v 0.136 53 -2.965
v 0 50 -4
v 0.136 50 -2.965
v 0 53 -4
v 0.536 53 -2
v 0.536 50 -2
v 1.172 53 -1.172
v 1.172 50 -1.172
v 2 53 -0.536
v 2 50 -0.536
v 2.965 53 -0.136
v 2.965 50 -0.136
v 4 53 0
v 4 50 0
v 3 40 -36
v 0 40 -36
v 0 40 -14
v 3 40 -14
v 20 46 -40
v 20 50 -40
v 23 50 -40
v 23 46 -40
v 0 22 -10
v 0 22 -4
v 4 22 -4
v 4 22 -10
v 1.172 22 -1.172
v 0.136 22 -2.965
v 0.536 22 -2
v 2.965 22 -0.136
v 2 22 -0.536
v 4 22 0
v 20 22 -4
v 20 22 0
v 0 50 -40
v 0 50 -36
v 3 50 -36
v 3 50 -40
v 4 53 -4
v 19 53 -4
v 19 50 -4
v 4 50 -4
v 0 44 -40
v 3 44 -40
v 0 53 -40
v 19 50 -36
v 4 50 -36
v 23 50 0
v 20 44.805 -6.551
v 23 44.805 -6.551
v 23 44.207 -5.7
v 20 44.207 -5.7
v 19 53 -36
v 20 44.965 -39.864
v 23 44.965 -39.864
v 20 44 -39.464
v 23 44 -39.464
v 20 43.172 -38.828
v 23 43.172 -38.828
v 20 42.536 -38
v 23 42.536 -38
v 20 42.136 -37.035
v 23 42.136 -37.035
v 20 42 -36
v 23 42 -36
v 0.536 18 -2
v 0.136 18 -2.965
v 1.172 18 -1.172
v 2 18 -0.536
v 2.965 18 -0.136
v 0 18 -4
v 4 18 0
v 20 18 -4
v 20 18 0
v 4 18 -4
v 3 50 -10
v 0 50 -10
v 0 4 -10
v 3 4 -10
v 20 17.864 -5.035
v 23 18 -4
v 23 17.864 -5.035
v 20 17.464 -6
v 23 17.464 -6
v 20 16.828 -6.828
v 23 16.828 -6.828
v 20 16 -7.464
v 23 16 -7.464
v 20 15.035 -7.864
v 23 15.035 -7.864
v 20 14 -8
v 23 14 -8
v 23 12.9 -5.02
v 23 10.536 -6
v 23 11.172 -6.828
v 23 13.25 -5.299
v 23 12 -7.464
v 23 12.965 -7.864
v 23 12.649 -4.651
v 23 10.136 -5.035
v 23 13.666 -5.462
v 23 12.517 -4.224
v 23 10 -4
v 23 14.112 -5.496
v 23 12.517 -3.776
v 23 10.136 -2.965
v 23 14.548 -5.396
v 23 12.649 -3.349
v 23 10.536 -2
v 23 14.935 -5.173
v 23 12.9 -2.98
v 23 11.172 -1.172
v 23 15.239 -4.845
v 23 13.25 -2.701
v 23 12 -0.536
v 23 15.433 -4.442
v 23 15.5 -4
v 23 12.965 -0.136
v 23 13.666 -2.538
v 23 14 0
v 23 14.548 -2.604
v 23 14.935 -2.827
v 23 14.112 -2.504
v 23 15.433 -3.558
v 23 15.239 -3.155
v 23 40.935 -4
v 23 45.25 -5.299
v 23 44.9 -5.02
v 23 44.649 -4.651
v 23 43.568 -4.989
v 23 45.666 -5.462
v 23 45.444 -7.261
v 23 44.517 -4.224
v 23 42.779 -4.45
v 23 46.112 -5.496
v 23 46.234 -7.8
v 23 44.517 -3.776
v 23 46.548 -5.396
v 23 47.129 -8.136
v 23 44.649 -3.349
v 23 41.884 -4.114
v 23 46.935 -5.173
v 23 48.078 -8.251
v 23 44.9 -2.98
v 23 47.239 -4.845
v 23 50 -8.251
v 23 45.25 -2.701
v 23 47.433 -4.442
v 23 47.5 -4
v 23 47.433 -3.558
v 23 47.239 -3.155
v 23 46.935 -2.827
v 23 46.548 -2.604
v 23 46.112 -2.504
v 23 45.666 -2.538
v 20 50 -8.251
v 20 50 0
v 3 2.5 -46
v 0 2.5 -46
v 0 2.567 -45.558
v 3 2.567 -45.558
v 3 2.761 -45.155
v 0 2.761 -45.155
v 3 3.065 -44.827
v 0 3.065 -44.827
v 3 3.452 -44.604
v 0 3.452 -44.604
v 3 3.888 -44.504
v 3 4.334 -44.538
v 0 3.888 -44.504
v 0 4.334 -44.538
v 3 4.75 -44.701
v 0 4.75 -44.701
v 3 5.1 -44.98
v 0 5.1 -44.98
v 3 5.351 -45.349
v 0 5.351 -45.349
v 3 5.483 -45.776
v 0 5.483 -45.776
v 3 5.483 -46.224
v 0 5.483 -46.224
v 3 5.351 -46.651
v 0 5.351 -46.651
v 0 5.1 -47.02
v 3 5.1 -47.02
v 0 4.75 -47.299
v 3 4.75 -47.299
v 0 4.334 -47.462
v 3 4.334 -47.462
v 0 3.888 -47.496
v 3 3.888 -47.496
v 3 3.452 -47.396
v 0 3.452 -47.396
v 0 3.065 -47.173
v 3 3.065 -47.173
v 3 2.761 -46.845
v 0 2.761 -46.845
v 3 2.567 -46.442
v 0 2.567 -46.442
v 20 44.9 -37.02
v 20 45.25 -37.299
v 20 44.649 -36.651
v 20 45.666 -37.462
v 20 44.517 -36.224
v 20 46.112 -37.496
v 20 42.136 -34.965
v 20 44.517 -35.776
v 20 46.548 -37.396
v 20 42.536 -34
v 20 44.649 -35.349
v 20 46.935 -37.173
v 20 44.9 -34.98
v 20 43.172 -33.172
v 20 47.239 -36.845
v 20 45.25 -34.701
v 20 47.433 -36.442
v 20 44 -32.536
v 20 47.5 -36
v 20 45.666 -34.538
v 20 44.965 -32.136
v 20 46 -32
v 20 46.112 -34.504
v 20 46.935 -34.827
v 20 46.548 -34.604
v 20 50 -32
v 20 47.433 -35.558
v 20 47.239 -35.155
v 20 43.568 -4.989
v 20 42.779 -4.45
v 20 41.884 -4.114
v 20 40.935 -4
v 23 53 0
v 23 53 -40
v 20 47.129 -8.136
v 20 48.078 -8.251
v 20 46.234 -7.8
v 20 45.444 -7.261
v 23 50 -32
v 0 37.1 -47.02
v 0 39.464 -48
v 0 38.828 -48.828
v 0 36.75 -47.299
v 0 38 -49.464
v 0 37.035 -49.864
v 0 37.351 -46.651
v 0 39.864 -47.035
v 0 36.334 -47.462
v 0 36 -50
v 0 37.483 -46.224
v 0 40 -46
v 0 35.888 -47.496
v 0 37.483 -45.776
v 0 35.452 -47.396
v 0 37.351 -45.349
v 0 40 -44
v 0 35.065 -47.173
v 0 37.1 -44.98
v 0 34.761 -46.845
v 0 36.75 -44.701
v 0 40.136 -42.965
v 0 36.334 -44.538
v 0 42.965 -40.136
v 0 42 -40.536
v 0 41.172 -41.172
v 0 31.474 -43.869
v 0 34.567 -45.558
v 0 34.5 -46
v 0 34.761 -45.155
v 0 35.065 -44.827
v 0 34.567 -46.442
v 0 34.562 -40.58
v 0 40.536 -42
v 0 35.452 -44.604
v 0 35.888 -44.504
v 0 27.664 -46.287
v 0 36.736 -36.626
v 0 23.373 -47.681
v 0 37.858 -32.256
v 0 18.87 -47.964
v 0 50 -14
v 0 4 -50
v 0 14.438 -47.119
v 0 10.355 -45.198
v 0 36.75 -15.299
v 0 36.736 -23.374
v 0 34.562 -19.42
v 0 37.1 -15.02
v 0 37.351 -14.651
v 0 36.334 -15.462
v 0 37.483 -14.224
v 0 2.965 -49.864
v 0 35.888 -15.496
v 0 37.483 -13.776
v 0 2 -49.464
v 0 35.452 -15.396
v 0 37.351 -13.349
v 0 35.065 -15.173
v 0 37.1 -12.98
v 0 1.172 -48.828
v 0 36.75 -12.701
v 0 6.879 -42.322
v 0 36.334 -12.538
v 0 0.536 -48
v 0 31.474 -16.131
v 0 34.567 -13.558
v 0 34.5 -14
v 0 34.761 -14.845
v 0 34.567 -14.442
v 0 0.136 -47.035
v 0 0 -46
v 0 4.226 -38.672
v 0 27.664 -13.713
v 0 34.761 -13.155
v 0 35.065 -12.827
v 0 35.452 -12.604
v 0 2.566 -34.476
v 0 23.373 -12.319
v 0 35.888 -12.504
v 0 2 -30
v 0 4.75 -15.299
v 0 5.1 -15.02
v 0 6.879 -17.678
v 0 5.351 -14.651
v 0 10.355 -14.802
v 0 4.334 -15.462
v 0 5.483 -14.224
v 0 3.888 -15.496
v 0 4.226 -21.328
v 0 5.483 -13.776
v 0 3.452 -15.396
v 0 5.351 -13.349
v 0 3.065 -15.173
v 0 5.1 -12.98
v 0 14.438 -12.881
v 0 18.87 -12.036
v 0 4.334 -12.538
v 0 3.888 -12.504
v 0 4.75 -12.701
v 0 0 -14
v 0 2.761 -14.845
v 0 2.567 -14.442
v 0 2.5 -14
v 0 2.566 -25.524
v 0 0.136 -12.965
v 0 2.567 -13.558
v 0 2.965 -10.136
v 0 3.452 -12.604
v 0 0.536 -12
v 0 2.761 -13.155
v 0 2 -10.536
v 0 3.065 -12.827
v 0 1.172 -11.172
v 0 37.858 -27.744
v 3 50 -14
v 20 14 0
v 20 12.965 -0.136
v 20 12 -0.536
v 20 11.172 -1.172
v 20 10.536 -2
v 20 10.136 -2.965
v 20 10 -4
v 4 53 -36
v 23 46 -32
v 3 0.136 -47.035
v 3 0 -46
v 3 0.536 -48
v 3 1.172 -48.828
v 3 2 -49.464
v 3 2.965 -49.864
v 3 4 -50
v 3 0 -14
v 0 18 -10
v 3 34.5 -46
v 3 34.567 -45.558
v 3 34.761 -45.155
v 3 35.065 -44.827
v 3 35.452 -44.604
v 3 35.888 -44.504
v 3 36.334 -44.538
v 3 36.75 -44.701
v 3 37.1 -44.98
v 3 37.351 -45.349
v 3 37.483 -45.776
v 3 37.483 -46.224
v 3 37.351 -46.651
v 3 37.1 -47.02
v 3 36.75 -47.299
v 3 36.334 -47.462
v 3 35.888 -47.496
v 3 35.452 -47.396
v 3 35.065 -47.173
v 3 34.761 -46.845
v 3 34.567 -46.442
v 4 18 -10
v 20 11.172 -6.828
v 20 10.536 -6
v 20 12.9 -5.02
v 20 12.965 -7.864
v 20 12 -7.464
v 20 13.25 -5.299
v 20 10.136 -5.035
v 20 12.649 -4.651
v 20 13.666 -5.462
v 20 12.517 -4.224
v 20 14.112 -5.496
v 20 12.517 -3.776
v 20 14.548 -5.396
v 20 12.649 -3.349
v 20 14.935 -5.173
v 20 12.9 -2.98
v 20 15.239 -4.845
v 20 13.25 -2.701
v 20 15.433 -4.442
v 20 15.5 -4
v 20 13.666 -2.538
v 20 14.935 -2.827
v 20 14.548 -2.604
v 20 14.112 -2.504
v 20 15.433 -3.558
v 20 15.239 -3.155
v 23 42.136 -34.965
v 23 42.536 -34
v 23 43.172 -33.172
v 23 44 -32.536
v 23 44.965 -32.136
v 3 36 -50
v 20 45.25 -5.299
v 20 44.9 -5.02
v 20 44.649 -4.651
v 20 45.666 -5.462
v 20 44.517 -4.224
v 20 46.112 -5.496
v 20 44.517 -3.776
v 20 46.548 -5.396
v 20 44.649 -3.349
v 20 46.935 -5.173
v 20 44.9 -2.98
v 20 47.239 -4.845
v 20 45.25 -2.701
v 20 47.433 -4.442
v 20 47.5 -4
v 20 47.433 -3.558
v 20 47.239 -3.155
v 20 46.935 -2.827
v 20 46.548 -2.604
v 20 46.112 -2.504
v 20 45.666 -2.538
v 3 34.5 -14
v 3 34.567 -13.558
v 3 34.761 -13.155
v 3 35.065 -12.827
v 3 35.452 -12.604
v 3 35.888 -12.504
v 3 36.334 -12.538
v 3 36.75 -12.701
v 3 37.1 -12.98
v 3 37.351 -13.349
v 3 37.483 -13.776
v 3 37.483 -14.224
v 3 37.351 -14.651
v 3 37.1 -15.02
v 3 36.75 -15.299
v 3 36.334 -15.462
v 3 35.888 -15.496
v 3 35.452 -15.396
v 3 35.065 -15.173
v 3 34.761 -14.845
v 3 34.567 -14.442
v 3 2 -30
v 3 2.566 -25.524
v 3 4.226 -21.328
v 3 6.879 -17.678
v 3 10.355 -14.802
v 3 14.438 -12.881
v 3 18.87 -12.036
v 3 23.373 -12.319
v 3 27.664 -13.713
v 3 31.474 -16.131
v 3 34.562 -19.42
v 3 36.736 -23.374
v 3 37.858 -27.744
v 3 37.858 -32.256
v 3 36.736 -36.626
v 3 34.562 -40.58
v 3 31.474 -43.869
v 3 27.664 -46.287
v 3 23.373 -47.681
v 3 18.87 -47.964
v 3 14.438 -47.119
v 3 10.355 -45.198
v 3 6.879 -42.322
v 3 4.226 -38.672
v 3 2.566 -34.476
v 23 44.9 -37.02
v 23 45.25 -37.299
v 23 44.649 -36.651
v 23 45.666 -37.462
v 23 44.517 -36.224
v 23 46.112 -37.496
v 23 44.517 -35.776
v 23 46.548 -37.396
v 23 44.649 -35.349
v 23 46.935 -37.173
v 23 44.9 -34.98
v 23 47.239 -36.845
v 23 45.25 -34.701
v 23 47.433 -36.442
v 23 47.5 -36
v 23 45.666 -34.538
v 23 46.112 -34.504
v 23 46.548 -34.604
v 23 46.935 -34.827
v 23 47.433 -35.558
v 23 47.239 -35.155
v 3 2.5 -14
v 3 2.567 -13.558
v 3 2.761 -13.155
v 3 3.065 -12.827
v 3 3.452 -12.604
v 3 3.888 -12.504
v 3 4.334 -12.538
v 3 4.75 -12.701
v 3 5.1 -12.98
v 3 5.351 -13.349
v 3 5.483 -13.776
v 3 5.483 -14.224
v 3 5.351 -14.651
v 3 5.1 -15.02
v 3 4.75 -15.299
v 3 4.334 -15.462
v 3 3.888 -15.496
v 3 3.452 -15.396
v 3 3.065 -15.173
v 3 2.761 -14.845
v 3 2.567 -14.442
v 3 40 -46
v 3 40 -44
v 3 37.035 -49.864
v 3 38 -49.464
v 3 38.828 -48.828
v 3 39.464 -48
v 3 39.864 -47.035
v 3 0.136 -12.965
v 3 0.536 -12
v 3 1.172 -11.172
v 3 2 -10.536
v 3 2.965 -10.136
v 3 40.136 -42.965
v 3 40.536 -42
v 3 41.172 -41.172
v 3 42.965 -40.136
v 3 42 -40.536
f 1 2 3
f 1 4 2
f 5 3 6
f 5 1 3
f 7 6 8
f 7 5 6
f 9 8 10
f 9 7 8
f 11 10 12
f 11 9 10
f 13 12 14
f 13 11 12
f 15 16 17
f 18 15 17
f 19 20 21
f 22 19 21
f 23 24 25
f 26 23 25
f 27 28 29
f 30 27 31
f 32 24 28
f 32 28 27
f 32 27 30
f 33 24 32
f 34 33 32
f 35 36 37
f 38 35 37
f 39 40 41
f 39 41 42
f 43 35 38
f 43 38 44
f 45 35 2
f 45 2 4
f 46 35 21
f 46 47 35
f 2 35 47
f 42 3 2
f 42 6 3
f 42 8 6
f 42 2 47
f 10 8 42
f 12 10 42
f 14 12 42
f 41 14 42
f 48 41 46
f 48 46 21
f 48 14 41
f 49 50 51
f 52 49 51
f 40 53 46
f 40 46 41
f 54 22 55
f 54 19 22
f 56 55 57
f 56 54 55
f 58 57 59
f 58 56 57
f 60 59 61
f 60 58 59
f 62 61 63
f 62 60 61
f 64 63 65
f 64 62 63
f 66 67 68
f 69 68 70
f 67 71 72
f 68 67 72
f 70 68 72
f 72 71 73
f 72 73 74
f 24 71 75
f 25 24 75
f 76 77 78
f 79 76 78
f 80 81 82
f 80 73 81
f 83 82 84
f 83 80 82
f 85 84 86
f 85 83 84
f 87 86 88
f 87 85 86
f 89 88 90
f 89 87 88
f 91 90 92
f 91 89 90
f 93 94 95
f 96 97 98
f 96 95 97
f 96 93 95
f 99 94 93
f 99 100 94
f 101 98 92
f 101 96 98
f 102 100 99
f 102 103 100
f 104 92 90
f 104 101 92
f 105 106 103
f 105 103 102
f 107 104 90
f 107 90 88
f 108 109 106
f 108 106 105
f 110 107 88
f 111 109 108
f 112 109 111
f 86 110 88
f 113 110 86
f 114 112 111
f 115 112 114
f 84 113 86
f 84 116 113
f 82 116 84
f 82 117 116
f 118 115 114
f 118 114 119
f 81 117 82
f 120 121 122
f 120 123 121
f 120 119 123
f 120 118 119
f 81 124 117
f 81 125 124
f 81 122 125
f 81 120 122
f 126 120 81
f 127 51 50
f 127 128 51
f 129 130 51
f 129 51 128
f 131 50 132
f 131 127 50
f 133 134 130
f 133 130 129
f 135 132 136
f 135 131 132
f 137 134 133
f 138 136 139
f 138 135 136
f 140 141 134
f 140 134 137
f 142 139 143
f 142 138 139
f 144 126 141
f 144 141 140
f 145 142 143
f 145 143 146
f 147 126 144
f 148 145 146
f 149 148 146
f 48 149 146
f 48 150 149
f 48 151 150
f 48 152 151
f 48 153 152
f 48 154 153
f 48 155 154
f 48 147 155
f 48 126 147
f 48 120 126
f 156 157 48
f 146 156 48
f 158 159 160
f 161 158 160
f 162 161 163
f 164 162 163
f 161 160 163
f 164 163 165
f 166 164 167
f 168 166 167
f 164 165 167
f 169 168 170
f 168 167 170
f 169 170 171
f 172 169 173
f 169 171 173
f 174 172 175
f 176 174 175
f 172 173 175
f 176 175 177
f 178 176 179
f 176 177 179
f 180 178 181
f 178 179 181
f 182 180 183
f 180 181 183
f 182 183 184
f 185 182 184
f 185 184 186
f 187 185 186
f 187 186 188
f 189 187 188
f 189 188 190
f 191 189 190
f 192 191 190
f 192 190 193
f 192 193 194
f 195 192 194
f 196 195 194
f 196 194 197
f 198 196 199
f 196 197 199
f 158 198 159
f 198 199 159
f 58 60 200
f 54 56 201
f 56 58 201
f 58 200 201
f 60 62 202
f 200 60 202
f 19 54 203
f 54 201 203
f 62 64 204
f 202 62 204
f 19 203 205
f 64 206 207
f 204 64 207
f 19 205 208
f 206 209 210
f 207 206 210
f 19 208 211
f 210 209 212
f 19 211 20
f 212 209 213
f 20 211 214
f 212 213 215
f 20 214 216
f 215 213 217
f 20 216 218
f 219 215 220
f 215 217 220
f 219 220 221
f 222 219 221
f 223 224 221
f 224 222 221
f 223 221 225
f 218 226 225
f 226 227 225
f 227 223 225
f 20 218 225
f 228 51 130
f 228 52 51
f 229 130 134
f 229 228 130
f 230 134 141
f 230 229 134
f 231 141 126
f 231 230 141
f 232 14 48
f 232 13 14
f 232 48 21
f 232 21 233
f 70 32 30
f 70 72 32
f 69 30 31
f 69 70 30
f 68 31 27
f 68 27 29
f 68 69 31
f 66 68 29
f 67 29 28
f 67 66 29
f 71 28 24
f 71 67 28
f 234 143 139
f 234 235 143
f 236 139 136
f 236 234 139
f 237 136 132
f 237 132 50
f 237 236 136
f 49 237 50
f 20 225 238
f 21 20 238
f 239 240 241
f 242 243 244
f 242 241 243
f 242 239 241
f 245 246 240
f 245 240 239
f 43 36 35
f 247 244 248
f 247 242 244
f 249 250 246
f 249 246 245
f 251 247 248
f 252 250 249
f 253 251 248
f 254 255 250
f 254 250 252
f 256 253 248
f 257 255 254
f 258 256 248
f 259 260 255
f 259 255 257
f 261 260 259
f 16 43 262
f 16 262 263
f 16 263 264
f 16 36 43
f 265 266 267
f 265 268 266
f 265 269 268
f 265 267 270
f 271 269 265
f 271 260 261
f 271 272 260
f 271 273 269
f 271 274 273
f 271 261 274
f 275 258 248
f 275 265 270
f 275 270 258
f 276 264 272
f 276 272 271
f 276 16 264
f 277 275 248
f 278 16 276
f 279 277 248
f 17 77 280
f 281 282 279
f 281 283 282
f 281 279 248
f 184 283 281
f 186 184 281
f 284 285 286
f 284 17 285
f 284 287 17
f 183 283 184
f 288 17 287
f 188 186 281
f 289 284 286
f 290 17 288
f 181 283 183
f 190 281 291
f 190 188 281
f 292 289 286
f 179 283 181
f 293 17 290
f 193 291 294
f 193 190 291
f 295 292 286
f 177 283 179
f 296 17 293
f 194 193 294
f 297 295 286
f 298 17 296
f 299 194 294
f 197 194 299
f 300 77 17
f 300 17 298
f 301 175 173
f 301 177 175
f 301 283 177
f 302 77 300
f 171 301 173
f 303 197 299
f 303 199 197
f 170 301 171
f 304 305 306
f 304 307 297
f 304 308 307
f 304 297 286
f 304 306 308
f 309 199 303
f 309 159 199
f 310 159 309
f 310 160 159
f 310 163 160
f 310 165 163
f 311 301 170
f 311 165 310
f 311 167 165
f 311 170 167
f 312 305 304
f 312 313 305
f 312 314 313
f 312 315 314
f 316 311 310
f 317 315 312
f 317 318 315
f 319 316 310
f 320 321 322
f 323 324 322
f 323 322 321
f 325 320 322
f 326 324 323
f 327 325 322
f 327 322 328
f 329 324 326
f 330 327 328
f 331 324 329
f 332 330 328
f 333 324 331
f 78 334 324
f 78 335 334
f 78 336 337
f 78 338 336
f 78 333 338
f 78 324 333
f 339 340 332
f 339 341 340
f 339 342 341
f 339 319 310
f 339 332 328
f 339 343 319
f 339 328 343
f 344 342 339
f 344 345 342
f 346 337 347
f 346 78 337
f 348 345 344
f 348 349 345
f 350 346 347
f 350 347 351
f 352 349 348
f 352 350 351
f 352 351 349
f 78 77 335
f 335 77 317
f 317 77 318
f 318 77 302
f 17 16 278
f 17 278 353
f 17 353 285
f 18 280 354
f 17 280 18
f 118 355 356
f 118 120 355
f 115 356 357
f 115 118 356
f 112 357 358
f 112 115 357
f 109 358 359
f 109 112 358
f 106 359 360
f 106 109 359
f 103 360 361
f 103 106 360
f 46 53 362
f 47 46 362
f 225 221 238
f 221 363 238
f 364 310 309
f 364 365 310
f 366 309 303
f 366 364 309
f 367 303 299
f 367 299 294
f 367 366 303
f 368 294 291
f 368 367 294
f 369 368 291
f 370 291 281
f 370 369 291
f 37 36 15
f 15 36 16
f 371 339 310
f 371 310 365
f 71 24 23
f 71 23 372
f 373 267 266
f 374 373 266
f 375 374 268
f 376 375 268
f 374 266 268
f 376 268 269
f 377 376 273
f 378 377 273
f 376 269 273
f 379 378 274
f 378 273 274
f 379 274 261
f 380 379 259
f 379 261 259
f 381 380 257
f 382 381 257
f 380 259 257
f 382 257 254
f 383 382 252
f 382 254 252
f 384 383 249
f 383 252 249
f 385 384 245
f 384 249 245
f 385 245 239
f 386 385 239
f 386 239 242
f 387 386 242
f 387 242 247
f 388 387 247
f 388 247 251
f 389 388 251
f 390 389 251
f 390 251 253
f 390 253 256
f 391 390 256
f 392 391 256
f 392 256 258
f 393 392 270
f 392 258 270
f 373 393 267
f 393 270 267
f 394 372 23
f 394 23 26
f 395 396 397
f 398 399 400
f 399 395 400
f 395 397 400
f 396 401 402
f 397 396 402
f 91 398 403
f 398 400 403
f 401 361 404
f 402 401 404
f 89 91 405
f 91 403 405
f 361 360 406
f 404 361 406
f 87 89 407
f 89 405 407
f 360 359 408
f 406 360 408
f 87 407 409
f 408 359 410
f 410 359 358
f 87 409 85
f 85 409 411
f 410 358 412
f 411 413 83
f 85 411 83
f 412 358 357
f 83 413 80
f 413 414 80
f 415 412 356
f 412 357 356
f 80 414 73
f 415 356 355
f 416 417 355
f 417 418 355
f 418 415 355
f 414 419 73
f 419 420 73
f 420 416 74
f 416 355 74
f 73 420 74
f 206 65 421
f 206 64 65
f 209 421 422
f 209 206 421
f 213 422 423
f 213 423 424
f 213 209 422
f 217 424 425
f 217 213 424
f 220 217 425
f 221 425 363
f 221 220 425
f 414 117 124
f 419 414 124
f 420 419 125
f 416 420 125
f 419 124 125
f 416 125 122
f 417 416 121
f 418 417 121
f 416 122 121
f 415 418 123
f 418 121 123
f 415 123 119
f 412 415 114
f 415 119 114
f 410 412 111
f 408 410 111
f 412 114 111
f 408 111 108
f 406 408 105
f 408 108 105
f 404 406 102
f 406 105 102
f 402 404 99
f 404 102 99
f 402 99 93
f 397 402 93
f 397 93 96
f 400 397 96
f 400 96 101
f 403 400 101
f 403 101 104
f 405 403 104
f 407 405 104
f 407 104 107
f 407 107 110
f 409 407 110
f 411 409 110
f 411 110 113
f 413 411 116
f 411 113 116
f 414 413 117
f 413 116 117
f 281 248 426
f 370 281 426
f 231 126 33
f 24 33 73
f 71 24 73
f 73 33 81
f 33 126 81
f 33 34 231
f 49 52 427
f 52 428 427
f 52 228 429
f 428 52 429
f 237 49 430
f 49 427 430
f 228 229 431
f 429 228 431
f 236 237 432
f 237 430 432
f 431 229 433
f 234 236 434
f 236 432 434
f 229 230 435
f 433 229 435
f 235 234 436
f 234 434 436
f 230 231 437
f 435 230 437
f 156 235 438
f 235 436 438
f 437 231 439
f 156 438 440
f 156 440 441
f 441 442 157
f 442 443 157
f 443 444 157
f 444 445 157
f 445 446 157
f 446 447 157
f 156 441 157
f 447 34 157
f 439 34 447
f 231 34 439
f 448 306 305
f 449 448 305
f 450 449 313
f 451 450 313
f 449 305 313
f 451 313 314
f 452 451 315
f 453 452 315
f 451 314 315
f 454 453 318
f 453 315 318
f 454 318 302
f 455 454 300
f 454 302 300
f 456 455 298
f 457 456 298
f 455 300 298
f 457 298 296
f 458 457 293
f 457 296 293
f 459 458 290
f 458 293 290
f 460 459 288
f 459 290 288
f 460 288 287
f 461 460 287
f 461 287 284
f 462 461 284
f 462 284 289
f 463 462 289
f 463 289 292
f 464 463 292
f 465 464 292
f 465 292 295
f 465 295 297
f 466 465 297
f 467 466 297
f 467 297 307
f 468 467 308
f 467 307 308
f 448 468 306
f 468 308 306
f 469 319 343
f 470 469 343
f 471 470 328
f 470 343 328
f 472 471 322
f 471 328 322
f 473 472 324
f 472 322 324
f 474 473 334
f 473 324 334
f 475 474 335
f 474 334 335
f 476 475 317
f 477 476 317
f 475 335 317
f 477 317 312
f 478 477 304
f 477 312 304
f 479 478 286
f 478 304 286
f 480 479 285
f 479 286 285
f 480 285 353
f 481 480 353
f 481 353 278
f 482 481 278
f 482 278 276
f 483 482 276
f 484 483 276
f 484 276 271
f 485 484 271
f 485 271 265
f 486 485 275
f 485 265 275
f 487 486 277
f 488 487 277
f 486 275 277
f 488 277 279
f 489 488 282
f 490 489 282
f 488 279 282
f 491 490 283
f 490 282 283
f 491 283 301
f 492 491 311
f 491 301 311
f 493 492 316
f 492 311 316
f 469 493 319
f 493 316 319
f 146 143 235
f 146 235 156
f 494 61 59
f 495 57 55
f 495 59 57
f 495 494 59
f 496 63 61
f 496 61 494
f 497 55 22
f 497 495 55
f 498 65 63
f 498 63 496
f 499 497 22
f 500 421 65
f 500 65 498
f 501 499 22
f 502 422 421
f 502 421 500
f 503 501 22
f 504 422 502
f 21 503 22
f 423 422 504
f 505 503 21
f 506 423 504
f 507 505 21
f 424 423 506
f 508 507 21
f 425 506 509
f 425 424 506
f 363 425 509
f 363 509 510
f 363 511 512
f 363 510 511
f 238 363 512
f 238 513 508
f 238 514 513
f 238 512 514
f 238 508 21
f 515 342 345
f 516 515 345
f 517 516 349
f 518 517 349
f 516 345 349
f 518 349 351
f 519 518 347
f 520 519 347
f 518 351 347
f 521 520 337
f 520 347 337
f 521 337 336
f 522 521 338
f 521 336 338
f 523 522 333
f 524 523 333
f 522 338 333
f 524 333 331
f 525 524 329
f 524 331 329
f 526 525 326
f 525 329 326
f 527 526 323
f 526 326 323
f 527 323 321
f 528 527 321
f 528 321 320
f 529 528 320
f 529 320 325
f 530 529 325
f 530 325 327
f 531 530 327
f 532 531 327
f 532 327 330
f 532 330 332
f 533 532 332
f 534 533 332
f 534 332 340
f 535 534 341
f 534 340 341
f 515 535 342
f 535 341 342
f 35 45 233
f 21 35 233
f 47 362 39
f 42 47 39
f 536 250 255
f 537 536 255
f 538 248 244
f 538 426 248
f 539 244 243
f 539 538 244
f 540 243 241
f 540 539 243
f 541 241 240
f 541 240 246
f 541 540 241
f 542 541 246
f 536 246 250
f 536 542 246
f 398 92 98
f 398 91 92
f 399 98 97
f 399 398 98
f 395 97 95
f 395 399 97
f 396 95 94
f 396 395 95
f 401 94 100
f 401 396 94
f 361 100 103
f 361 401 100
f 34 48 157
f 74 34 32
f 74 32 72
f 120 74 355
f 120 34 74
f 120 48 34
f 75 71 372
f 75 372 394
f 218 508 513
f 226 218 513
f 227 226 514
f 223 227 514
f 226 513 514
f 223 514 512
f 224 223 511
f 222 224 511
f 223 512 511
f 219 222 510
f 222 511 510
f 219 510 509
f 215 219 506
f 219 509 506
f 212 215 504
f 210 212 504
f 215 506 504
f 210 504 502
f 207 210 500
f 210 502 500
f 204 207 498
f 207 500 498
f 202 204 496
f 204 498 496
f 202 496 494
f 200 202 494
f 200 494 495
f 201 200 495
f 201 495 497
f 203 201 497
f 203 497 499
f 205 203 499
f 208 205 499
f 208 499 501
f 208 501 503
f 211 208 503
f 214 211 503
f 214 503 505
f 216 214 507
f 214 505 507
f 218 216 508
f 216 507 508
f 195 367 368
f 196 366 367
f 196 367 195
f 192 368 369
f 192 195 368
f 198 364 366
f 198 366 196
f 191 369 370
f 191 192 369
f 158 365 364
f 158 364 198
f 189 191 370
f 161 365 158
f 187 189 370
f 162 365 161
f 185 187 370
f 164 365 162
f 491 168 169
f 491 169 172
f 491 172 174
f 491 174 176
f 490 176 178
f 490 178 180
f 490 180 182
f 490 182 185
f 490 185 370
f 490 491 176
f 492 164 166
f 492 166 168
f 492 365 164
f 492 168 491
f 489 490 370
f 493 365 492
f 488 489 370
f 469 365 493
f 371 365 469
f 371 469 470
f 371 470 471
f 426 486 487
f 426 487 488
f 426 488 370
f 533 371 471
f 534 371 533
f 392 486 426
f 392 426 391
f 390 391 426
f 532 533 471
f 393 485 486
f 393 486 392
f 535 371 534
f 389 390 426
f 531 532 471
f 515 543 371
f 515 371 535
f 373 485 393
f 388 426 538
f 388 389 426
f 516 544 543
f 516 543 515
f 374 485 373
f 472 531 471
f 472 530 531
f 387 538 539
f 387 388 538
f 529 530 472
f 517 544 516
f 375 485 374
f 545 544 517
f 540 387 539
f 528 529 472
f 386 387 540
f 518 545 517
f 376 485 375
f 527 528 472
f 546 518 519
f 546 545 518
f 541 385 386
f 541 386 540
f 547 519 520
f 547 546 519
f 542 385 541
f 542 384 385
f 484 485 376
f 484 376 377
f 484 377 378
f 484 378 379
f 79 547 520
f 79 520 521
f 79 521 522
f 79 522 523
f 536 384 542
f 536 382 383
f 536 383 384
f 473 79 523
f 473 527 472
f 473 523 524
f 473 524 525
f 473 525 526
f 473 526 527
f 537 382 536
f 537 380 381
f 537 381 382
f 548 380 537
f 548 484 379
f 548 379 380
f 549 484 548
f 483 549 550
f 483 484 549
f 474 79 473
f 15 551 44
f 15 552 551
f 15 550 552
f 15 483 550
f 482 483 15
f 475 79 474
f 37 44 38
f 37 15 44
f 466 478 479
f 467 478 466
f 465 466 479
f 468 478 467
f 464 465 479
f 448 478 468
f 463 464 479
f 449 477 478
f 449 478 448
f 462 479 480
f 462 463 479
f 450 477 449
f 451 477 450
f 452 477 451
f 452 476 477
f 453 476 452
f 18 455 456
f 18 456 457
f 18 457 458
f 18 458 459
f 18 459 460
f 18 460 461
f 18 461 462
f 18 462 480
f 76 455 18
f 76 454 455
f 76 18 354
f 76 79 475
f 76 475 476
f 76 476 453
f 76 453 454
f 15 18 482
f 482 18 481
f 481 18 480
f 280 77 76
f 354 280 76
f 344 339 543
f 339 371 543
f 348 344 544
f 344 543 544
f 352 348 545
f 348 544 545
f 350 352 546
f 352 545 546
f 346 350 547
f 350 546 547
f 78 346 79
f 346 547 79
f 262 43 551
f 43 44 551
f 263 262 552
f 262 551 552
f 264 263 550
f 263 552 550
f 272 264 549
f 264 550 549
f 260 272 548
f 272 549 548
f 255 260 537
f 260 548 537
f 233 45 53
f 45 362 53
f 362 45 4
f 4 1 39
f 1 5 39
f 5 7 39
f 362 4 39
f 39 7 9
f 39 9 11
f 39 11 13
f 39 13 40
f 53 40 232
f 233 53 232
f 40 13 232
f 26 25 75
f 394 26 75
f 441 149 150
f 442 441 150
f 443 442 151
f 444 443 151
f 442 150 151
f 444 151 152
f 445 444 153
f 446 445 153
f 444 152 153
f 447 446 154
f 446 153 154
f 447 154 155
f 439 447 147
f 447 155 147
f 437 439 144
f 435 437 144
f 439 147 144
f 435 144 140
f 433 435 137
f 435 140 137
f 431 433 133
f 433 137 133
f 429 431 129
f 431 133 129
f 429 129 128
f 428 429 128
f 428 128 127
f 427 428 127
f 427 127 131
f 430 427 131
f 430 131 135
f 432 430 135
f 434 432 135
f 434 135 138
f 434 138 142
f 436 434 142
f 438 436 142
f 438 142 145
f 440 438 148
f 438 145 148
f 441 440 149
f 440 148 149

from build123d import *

# Parameters (mm, degrees)
F0_W      = 3
F0_H      = 40
F0_H_2    = 10
F3_DEPTH  = 50
F2_W      = 3
F2_H      = 40
F4_DEPTH  = 40
F1_W      = 23
F1_H      = 3
F5_DEPTH  = 40
F6_R      = 18
F7_DEPTH  = 3
F8_R      = 1.5
F9_DEPTH  = 3
F11_DEPTH = 3
F12_R     = 1.5
F13_DEPTH = 3
F14_W     = 15
F14_H     = 32
F15_DEPTH = 3
F16_W     = 10
F16_H     = 10
F17_DEPTH = 3
F18_W     = 10
F18_H     = 22
F18_W_2   = 50
F18_H_2   = 10
F19_DEPTH = 3
F20_W     = 4
F20_H     = 23.7494786941
F21_DEPTH = 3
F22_R     = 3.99999
F22_2_R   = 3.99999
F23_W     = 4
F23_H     = 4
F24_DEPTH = 20
F25_W     = 4
F25_H     = 4
F26_DEPTH = 6
F27_R     = 3.99999
F27_2_R   = 3.99999


# Not quite as in the source:
# - a fillet or chamfer is up to 0.001 mm smaller than in the source, because OpenCascade refuses the exact size


with BuildPart() as f3:
    # F0 (on Top) → F3 (new body)
    with BuildSketch(Plane.XY):
        with Locations((1.5, 20)):
            Rectangle(F0_W, F0_H)
        with Locations((1.5, 45)):
            Rectangle(F0_W, F0_H_2)
    extrude(amount=-F3_DEPTH)

    # F6 (on face) → F7 (cut)
    with BuildSketch(Plane(origin=(0, 0, 0), x_dir=(0, -1, 0), z_dir=(-1, 0, 0))):
        with Locations((-20, -30)):
            Circle(F6_R)
    extrude(amount=-F7_DEPTH, mode=Mode.SUBTRACT)

    # F8 (on face) → F9 (cut)
    with BuildSketch(Plane(origin=(0, 0, 0), x_dir=(0, -1, 0), z_dir=(-1, 0, 0))):
        with Locations((-4, -14)):
            Circle(F8_R)
        with Locations((-4, -46)):
            Circle(F8_R)
        with Locations((-36, -14)):
            Circle(F8_R)
        with Locations((-36, -46)):
            Circle(F8_R)
    extrude(amount=-F9_DEPTH, mode=Mode.SUBTRACT)

    # F16 (on face) → F17 (cut)
    with BuildSketch(Plane(origin=(0, 0, 0), x_dir=(0, -1, 0), z_dir=(-1, 0, 0))):
        with Locations((-45, -45)):
            Rectangle(F16_W, F16_H)
    extrude(amount=-F17_DEPTH, mode=Mode.SUBTRACT)

    # F18 (on face) → F19 (cut)
    with BuildSketch(Plane(origin=(0, 0, 0), x_dir=(0, -1, 0), z_dir=(-1, 0, 0))):
        with Locations((-45, -25)):
            Rectangle(F18_W, F18_H)
        with Locations((-25, -5)):
            Rectangle(F18_W_2, F18_H_2)
    extrude(amount=-F19_DEPTH, mode=Mode.SUBTRACT)

    # F22#2 (radius 4 in the source; OpenCascade refuses exactly that, so slightly less here)
    f22_2_edges = [f3.edges().sort_by_distance(p)[0] for p in [
        (1.5, 0, -10),
        (1.5, 0, -50),
        (1.5, 40, -50),
        (1.5, 40, -40),
    ]]
    fillet(f22_2_edges, radius=F22_2_R)


with BuildPart() as f4:
    # F2 (on Top) → F4 (new body)
    with BuildSketch(Plane.XY):
        with Locations((21.5, 30)):
            Rectangle(F2_W, F2_H)
    extrude(amount=-F4_DEPTH)

    # F10 (on face) → F11 (cut)
    with BuildSketch(Plane.YZ.offset(23)):
        Polygon((18, -8), (10, -8), (10, -40), (42, -40), (42, -32), (46, -32), (46, -8.2505213059), (43.0126793981, -4), (18, -4), align=None)
    extrude(amount=-F11_DEPTH, mode=Mode.SUBTRACT)

    # F12 (on face) → F13 (cut)
    with BuildSketch(Plane.YZ.offset(23)):
        with Locations((14, -4)):
            Circle(F12_R)
        with Locations((46, -4)):
            Circle(F12_R)
        with Locations((46, -36)):
            Circle(F12_R)
    extrude(amount=-F13_DEPTH, mode=Mode.SUBTRACT)

    # F20 (on face) → F21 (cut)
    with BuildSketch(Plane.YZ.offset(23)):
        with Locations((48, -20.125260653)):
            Rectangle(F20_W, F20_H)
    extrude(amount=-F21_DEPTH, mode=Mode.SUBTRACT)

    # F22 (radius 4 in the source; OpenCascade refuses exactly that, so slightly less here)
    f22_edges = [f4.edges().sort_by_distance(p)[0] for p in [
        (21.5, 10, 0),
        (21.5, 10, -8),
        (21.5, 18, -8),
        (21.5, 43.012679, -4),
        (21.5, 42, -40),
        (21.5, 42, -32),
        (21.5, 46, -8.250521),
    ]]
    fillet(f22_edges, radius=F22_R)

    # F23 (on face) → F24 (join)
    with BuildSketch(Plane(origin=(20, 0, 0), x_dir=(0, -1, 0), z_dir=(-1, 0, 0))):
        with Locations((-20, -2)):
            Rectangle(F23_W, F23_H)
    extrude(amount=F24_DEPTH)

    # F27#2 (radius 4 in the source; OpenCascade refuses exactly that, so slightly less here)
    f27_2_edges = [f4.edges().sort_by_distance(p)[0] for p in [
        (0, 20, 0),
    ]]
    fillet(f27_2_edges, radius=F27_2_R)


with BuildPart() as f5:
    # F1 (on Top) → F5 (new body)
    with BuildSketch(Plane.XY):
        with Locations((11.5, 51.5)):
            Rectangle(F1_W, F1_H)
    extrude(amount=-F5_DEPTH)

    # F14 (on face) → F15 (cut)
    with BuildSketch(Plane(origin=(0, 53, 0), x_dir=(-1, 0, 0), z_dir=(0, 1, 0))):
        with Locations((-11.5, -20)):
            Rectangle(F14_W, F14_H)
    extrude(amount=-F15_DEPTH, mode=Mode.SUBTRACT)

    # F27 (radius 4 in the source; OpenCascade refuses exactly that, so slightly less here)
    f27_edges = [f5.edges().sort_by_distance(p)[0] for p in [
        (0, 51.5, 0),
    ]]
    fillet(f27_edges, radius=F27_R)


with BuildPart() as f26:
    # F25 (on face) → F26 (new body, through all)
    with BuildSketch(Plane(origin=(0, 0, -4), x_dir=(1, 0, 0), z_dir=(0, 0, -1))):
        with Locations((2, -20)):
            Rectangle(F25_W, F25_H)
    extrude(amount=F26_DEPTH)


solid = Compound([f3.part, f4.part, f5.part, f26.part])
